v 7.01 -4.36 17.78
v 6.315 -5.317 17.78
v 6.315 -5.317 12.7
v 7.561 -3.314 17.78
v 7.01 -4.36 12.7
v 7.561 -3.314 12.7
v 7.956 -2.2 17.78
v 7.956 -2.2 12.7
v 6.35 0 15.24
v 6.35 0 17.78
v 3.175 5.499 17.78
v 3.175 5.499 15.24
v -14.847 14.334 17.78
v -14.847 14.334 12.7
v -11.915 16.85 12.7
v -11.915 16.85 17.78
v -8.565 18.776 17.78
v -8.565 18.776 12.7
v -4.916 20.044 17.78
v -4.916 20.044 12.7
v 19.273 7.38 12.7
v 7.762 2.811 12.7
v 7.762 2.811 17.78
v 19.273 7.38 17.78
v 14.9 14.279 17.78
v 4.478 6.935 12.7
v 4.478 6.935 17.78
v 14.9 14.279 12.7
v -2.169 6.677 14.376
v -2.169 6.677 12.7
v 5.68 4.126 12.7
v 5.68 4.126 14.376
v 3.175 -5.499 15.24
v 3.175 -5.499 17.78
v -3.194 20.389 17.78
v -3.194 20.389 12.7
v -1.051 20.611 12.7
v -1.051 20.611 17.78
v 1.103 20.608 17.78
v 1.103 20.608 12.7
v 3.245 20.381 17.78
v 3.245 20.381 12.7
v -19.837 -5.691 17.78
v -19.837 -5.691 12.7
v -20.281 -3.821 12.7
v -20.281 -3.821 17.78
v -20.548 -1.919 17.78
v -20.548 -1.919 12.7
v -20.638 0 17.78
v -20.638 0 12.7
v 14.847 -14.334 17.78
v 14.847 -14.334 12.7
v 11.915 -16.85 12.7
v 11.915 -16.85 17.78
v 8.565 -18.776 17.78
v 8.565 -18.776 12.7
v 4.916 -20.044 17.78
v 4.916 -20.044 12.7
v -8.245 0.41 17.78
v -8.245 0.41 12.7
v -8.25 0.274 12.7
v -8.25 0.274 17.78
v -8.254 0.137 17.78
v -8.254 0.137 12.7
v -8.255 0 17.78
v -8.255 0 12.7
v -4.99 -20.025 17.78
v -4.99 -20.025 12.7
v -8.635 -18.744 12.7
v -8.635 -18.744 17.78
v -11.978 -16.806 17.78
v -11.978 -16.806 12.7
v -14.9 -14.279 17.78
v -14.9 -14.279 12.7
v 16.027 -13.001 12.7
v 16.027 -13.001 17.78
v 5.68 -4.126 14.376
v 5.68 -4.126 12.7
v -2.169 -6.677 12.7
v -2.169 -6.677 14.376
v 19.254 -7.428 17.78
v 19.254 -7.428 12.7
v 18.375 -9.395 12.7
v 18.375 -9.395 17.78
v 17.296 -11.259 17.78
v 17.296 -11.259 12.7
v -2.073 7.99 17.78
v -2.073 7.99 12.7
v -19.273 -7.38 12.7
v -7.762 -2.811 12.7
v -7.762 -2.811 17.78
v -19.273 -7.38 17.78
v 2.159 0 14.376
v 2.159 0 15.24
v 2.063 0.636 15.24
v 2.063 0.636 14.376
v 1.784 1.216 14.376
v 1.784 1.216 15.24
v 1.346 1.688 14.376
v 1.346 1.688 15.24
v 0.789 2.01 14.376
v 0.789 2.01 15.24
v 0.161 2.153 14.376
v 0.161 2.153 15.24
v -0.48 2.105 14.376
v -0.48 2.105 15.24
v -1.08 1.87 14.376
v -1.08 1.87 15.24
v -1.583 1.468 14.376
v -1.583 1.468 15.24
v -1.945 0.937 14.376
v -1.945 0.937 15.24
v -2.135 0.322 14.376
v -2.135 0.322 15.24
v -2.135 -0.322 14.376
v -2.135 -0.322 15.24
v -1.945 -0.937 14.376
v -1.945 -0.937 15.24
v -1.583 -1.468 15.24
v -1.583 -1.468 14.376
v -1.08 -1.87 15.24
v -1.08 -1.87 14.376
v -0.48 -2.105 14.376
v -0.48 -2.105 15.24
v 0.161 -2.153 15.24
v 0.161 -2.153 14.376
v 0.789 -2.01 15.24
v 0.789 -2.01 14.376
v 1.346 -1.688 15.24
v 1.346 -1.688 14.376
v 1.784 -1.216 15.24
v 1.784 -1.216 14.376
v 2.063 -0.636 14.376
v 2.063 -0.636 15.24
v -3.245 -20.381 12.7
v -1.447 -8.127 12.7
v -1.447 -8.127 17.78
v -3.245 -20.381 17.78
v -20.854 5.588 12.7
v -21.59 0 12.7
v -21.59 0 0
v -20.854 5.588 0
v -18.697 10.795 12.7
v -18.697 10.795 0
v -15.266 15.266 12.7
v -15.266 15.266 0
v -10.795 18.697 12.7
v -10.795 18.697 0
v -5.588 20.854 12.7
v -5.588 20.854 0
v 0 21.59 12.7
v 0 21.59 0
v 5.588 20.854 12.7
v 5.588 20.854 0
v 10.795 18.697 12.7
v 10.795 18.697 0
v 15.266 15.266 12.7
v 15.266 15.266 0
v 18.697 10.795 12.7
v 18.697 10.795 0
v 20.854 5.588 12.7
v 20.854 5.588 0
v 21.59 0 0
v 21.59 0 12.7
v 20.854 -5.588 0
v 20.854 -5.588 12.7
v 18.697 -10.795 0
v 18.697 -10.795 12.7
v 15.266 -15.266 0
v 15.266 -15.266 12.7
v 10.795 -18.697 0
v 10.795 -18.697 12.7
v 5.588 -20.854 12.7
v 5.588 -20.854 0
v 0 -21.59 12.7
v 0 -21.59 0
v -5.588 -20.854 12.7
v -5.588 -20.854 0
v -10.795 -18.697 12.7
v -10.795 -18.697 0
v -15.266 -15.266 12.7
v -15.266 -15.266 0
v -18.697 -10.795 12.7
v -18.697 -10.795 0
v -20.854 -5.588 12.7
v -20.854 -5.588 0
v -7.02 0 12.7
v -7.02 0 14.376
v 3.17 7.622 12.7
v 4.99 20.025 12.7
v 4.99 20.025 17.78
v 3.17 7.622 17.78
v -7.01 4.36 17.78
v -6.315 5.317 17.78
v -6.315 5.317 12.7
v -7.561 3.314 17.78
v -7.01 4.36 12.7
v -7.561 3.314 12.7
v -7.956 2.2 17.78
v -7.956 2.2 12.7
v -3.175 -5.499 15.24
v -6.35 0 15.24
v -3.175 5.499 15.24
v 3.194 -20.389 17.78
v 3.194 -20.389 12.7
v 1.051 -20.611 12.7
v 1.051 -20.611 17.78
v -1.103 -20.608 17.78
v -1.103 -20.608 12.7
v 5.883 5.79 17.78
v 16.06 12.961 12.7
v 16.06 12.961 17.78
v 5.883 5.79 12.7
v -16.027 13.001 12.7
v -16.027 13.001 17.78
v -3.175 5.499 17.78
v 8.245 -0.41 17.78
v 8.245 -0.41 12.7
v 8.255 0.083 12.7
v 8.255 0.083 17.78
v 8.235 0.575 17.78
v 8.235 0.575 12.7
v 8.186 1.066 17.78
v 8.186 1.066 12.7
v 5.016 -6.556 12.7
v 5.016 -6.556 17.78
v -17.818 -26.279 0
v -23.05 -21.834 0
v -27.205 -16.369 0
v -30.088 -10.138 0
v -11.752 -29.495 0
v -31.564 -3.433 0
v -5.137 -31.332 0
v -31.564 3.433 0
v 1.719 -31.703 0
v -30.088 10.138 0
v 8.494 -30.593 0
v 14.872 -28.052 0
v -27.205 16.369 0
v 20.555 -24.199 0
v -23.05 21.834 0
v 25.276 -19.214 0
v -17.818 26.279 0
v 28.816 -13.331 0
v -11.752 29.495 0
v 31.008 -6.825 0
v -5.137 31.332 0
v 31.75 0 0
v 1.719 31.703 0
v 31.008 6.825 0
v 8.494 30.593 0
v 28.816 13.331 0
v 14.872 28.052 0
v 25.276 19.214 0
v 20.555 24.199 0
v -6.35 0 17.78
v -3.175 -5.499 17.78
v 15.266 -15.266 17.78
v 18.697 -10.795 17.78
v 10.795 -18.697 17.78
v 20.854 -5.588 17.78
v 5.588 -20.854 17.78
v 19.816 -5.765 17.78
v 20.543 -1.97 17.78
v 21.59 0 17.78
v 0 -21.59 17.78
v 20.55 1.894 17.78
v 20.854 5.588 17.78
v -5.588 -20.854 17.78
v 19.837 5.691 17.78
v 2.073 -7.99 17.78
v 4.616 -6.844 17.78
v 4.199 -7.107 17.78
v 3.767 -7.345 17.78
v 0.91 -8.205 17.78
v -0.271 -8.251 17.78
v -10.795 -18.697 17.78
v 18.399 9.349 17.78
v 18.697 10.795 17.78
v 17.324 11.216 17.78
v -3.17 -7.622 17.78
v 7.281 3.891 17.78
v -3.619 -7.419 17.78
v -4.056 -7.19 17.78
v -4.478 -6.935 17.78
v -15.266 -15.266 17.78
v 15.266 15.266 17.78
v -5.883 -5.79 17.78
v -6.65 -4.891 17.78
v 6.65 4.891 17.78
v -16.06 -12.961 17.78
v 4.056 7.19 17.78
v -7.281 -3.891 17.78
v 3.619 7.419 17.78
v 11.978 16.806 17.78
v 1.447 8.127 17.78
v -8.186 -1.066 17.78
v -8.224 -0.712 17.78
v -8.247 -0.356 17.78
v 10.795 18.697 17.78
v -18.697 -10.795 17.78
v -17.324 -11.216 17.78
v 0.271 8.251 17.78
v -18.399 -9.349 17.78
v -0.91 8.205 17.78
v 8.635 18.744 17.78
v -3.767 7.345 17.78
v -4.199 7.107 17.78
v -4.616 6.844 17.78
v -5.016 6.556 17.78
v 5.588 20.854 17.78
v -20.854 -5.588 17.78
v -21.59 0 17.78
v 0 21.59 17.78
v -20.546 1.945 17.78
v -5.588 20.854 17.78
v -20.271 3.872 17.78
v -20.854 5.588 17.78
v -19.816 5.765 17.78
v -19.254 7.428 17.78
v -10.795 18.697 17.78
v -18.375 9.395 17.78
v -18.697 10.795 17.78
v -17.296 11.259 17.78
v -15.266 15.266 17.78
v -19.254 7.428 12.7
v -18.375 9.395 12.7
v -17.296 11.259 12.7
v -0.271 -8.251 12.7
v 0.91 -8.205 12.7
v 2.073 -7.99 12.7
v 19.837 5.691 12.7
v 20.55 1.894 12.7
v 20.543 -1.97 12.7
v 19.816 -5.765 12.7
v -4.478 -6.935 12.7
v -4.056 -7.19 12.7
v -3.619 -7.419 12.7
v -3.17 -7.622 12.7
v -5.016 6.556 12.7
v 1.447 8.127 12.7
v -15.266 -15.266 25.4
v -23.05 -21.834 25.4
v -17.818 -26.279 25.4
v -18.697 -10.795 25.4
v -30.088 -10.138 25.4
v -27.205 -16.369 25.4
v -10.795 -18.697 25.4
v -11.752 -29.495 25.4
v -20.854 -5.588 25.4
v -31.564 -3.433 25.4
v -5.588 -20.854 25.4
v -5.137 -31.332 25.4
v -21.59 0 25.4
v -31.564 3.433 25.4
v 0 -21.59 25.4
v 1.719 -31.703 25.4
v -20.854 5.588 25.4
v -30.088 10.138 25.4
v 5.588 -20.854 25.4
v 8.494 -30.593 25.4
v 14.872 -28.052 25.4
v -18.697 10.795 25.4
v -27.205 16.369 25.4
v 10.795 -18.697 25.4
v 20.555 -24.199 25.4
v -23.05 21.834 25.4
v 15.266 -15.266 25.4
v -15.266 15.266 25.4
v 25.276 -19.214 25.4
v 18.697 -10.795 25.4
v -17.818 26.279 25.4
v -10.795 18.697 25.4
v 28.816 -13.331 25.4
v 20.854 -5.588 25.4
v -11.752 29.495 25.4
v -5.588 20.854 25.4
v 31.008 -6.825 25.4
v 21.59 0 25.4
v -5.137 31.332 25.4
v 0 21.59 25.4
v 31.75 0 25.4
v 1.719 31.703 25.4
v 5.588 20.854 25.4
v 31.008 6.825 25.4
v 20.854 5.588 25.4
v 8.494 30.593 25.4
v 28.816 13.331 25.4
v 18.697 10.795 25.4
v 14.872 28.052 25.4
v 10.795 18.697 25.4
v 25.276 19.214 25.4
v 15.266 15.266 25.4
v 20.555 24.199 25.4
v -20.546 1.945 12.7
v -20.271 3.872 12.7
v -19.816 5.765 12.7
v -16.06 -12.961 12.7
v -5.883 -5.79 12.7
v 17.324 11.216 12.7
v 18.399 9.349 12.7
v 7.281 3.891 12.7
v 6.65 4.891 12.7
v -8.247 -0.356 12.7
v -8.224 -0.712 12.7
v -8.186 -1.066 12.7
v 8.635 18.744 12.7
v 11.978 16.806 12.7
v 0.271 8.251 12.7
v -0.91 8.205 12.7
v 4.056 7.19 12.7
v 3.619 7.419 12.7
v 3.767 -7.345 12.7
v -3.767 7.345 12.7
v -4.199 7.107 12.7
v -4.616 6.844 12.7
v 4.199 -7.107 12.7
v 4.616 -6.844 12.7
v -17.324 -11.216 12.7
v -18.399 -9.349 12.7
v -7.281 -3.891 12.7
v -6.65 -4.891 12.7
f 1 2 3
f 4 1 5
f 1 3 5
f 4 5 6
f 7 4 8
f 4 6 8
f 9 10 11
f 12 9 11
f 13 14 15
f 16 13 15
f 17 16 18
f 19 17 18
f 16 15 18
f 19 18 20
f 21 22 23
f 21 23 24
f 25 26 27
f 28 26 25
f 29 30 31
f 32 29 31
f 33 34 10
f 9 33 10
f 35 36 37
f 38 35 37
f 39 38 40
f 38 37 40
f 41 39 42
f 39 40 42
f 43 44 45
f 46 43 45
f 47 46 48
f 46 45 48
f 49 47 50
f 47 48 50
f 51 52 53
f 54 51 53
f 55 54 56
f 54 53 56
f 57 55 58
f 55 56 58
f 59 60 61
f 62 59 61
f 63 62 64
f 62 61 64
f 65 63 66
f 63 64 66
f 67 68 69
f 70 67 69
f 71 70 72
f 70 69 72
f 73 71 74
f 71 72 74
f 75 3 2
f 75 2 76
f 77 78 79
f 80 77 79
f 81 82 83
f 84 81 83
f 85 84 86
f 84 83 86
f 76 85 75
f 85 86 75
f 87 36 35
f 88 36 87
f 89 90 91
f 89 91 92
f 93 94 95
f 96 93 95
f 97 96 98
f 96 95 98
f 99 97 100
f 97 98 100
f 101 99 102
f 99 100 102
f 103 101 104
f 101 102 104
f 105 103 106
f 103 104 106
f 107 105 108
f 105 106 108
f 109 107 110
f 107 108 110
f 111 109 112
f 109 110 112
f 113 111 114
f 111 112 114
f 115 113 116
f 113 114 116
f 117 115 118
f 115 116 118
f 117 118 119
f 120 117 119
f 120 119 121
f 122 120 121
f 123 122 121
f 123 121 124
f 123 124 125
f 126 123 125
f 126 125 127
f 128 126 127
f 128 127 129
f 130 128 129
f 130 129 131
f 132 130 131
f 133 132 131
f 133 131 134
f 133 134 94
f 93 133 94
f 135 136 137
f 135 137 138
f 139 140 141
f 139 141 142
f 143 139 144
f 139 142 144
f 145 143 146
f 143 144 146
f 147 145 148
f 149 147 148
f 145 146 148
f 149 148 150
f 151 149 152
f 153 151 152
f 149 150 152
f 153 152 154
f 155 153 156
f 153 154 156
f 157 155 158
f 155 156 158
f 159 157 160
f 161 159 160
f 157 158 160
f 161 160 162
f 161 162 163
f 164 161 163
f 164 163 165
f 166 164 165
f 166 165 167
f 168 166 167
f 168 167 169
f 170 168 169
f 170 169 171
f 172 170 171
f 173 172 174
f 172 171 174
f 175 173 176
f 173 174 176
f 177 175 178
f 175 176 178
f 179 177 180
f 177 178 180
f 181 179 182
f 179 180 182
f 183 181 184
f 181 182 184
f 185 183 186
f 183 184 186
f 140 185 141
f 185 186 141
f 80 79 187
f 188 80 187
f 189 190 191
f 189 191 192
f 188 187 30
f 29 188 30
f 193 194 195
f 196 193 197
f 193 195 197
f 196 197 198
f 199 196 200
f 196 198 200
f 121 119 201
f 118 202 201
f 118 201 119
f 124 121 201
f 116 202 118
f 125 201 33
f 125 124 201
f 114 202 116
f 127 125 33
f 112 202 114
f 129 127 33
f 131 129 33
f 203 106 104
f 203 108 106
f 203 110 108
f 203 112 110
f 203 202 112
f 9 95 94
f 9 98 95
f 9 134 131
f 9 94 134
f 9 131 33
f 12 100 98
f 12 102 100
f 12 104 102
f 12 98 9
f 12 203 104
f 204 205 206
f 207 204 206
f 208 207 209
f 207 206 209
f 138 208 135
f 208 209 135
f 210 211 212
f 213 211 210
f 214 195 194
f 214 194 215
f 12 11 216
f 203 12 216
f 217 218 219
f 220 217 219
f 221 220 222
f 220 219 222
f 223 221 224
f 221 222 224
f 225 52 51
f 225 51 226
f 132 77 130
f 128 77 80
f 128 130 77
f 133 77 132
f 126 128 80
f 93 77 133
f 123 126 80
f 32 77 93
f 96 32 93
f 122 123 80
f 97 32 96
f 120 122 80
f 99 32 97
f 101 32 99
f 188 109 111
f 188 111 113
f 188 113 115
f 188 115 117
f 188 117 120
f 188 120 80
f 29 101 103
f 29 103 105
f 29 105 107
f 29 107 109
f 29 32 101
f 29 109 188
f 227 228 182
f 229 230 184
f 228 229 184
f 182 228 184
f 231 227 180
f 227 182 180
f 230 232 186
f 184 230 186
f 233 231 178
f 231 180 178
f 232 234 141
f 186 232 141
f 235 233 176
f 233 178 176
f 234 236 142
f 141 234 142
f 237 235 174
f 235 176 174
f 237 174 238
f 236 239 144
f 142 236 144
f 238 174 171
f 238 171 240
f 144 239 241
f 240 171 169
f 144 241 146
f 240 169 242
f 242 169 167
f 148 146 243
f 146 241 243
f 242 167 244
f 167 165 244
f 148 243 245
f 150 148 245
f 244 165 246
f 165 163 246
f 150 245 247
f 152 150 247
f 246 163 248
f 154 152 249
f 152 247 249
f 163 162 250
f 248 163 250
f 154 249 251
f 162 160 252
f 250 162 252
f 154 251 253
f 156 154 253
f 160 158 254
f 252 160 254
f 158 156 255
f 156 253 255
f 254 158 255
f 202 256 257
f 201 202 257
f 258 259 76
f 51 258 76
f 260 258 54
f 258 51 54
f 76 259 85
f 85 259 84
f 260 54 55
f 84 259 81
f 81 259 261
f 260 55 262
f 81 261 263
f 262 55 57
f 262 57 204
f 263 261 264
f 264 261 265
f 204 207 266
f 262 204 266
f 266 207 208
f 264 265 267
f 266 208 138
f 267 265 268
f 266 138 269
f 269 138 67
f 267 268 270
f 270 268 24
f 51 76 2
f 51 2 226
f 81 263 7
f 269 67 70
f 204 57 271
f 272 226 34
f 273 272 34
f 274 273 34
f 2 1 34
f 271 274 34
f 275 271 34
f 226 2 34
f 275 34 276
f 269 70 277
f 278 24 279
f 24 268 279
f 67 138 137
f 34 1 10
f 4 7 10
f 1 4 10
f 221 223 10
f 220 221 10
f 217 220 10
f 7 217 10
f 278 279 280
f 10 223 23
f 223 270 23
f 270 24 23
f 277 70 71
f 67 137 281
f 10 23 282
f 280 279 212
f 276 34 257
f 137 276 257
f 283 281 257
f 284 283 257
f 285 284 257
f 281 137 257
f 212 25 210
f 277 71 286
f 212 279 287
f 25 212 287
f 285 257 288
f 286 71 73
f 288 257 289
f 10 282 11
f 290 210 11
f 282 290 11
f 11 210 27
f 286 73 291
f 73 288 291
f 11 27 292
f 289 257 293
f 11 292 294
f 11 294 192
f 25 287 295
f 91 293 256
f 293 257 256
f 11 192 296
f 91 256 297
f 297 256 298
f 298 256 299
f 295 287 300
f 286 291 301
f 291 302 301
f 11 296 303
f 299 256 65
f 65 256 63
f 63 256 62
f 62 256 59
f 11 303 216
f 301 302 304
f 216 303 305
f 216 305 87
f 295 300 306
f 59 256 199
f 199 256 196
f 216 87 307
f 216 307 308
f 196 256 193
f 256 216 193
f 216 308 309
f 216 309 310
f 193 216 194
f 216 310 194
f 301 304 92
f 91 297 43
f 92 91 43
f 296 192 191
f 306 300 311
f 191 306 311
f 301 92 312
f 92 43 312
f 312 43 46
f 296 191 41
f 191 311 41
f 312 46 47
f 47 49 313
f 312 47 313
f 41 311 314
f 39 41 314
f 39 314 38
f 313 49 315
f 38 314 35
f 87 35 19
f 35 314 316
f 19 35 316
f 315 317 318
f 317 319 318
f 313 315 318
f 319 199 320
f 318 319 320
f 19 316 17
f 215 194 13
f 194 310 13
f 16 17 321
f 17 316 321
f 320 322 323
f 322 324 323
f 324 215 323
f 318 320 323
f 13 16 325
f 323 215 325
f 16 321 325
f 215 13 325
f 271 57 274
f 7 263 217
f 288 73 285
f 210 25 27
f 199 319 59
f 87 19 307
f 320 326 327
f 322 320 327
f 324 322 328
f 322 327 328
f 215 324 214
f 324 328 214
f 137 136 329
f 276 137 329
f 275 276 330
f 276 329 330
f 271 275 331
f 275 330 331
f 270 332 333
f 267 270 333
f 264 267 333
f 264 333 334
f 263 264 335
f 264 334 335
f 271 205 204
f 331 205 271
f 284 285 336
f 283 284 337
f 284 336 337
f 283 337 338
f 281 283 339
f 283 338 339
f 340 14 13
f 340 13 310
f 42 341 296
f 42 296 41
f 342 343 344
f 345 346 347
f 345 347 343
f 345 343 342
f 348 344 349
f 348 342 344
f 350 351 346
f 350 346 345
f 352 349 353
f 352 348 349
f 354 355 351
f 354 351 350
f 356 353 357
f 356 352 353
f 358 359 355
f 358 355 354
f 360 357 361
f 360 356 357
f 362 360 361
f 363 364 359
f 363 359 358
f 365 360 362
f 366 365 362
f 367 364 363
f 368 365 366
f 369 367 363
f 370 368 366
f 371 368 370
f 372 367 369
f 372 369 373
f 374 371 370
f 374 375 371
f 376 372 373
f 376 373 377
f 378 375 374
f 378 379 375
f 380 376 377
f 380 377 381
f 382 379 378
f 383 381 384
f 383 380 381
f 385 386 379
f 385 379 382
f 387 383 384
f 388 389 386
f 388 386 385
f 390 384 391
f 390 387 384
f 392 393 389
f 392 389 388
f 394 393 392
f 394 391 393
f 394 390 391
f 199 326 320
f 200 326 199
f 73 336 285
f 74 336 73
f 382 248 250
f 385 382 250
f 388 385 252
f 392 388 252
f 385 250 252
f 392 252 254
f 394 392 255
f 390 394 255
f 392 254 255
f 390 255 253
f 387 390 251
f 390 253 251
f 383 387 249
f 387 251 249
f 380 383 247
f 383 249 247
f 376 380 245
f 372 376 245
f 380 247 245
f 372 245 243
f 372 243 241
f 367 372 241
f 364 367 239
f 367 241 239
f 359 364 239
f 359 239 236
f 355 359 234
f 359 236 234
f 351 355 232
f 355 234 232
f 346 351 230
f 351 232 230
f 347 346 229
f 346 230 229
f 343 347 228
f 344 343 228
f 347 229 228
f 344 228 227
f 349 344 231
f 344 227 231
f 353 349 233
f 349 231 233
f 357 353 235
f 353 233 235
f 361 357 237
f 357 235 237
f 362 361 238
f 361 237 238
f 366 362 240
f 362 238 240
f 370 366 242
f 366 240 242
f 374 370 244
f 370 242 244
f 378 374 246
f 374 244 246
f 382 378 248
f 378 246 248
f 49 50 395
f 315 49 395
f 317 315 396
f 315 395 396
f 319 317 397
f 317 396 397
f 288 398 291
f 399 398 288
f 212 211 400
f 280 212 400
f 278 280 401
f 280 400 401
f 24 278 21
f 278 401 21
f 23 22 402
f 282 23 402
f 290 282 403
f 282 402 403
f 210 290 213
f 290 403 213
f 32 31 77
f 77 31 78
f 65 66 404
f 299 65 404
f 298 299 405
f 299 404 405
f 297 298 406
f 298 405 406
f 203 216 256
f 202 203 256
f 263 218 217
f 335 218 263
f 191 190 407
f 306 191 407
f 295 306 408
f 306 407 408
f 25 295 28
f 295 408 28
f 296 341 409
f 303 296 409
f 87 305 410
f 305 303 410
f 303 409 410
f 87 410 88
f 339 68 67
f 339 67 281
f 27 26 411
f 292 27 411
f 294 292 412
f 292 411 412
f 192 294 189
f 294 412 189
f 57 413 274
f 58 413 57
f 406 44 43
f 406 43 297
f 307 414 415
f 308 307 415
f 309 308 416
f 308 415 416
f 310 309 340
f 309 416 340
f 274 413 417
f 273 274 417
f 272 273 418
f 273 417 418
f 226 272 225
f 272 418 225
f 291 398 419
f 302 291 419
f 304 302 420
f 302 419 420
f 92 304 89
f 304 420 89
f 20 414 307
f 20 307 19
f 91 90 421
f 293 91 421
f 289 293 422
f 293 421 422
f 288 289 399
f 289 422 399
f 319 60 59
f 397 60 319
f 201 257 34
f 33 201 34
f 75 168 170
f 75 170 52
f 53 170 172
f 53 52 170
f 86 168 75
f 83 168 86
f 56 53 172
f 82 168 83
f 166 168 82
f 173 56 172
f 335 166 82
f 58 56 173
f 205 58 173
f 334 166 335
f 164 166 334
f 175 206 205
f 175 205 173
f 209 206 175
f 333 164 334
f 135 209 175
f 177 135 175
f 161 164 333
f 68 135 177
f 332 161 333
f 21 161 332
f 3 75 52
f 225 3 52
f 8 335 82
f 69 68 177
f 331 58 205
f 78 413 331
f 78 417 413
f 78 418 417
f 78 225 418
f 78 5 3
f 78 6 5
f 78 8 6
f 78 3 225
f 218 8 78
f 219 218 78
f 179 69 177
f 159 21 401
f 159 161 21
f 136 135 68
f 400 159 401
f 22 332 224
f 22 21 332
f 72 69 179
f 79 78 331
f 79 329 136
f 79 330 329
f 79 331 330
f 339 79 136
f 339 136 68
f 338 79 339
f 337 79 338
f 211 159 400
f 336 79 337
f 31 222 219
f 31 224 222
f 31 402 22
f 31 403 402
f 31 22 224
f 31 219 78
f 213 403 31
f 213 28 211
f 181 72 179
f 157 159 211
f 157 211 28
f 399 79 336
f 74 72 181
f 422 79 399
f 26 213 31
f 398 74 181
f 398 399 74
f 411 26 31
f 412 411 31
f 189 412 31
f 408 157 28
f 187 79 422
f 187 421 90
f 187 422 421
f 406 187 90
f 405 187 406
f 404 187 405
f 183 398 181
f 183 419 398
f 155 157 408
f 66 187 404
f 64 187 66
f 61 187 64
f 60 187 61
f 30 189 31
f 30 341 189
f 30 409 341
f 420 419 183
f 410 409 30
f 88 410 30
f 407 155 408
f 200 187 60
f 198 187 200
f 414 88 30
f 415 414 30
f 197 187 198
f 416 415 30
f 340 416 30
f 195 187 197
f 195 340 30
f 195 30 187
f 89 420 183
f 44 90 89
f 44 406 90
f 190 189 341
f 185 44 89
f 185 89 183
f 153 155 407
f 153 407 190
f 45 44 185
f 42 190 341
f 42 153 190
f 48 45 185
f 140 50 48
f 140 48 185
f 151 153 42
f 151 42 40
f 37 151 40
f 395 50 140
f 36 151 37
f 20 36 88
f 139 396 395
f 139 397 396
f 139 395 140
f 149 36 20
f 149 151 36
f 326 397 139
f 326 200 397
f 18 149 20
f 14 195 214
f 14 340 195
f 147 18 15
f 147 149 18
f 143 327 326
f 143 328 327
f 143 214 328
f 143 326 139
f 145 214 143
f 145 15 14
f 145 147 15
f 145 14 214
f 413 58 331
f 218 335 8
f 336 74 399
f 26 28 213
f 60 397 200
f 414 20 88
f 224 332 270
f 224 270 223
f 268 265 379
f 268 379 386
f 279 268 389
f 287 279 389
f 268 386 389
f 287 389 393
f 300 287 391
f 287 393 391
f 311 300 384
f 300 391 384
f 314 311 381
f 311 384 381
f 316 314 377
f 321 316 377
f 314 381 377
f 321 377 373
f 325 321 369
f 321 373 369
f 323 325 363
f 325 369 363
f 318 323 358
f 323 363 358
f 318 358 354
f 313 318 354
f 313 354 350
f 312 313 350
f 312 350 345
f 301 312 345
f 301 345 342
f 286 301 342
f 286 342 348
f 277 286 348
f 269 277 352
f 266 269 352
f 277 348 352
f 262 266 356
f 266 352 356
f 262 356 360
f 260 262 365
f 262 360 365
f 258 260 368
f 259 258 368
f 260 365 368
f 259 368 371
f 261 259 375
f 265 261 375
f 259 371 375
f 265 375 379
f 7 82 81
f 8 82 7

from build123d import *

# Parameters (mm, degrees)
SKETCH1_R           = 31.75
BOSS_EXTRUDE1_DEPTH = 25.4
SKETCH3_R           = 21.59
CUT_EXTRUDE1_DEPTH  = 7.62
SKETCH4_R           = 21.59
CUT_EXTRUDE2_DEPTH  = 12.7
CUT_EXTRUDE3_DEPTH  = 13.7
BOSS_EXTRUDE2_DEPTH = 5.08
CIRPATTERN1_COUNT   = 6
CUT_EXTRUDE5_DEPTH  = 2.54
SKETCH8_R           = 2.159
CUT_EXTRUDE6_DEPTH  = 2.54
CUT_EXTRUDE7_DEPTH  = 1.6764


with BuildPart() as part:
    # Sketch1 → Boss-Extrude1 (new body)
    with BuildSketch(Plane.XY):
        Circle(SKETCH1_R)
    extrude(amount=BOSS_EXTRUDE1_DEPTH)

    # Sketch3 → Cut-Extrude1 (cut)
    with BuildSketch(Plane.XY.offset(25.4)):
        Circle(SKETCH3_R)
    extrude(amount=-CUT_EXTRUDE1_DEPTH, mode=Mode.SUBTRACT)

    # Sketch4 → Cut-Extrude2 (cut)
    with BuildSketch(Plane(origin=(0, 0, 0), x_dir=(-1, 0, 0), z_dir=(0, 0, -1))):
        Circle(SKETCH4_R)
    extrude(amount=-CUT_EXTRUDE2_DEPTH, mode=Mode.SUBTRACT)

    # Sketch5 → Cut-Extrude3 (cut, through all)
    with BuildSketch(Plane(origin=(0, 0, 12.7), x_dir=(-1, 0, 0), z_dir=(0, 0, -1))):
        with BuildLine():
            Line((-3.169774213, 7.622175309), (-4.990334321, 20.025058542))
            ThreePointArc((-4.990334321, 20.025058542), (-12.706659311, -16.261833088), (20.6375, 0))
            ThreePointArc((20.6375, 0), (16.238120297, 12.736948436), (4.915648471, 20.043522803))
            Line((4.915648471, 20.043522803), (3.767056418, 7.345359824))
            ThreePointArc((3.767056418, 7.345359824), (7.044220174, 4.303950178), (8.255, 0))
            ThreePointArc((8.255, 0), (-4.581404745, -6.867004847), (-3.169774213, 7.622175309))
        make_face()
        with BuildLine():
            ThreePointArc((-3.245486062, 20.380707212), (-4.121747911, 20.221711115), (-4.990334321, 20.025058542))
            Line((-4.990334321, 20.025058542), (-3.169774213, 7.622175309))
            ThreePointArc((-3.169774213, 7.622175309), (-2.322085611, 7.921675543), (-1.446854472, 8.127215829))
            Line((-1.446854472, 8.127215829), (-3.245486062, 20.380707212))
        make_face()
        with BuildLine():
            ThreePointArc((3.194434326, 20.388771311), (-0.025842356, 20.63748382), (-3.245486062, 20.380707212))
            Line((-3.245486062, 20.380707212), (-1.446854472, 8.127215829))
            ThreePointArc((-1.446854472, 8.127215829), (0.320434302, 8.248778507), (2.072967036, 7.990483882))
            Line((2.072967036, 7.990483882), (3.194434326, 20.388771311))
        make_face()
        with BuildLine():
            ThreePointArc((4.915648471, 20.043522803), (4.058714067, 20.234456908), (3.194434326, 20.388771311))
            Line((3.194434326, 20.388771311), (2.072967036, 7.990483882))
            ThreePointArc((2.072967036, 7.990483882), (2.937773774, 7.714564813), (3.767056418, 7.345359824))
            Line((3.767056418, 7.345359824), (4.915648471, 20.043522803))
        make_face()
    extrude(amount=-CUT_EXTRUDE3_DEPTH, mode=Mode.SUBTRACT)

    # Sketch5<3> → Boss-Extrude2 (add)
    with BuildSketch(Plane(origin=(0, 0, 12.7), x_dir=(-1, 0, 0), z_dir=(0, 0, -1))):
        with BuildLine():
            ThreePointArc((-3.245486062, 20.380707212), (-4.121747911, 20.221711115), (-4.990334321, 20.025058542))
            Line((-4.990334321, 20.025058542), (-3.169774213, 7.622175309))
            ThreePointArc((-3.169774213, 7.622175309), (-2.322085611, 7.921675543), (-1.446854472, 8.127215829))
            Line((-1.446854472, 8.127215829), (-3.245486062, 20.380707212))
        make_face()
        with BuildLine():
            ThreePointArc((4.915648471, 20.043522803), (4.058714067, 20.234456908), (3.194434326, 20.388771311))
            Line((3.194434326, 20.388771311), (2.072967036, 7.990483882))
            ThreePointArc((2.072967036, 7.990483882), (2.937773774, 7.714564813), (3.767056418, 7.345359824))
            Line((3.767056418, 7.345359824), (4.915648471, 20.043522803))
        make_face()
    boss_extrude2 = extrude(amount=-BOSS_EXTRUDE2_DEPTH)

    # CirPattern1: Boss-Extrude2 ×6 about axis
    cirpattern1_axis = Axis((0, 0, 0), (0, 0, 1))
    for i in range(1, CIRPATTERN1_COUNT):
        add(boss_extrude2.rotate(cirpattern1_axis, i * 360 / CIRPATTERN1_COUNT))

    # Sketch7 → Cut-Extrude5 (cut)
    with BuildSketch(Plane.XY.offset(17.78)):
        Polygon((6.35, 0), (3.175, 5.499261314), (-3.175, 5.499261314), (-6.35, 0), (-3.175, -5.499261314), (3.175, -5.499261314), align=None)
    extrude(amount=-CUT_EXTRUDE5_DEPTH, mode=Mode.SUBTRACT)

    # Sketch8 → Cut-Extrude6 (cut)
    with BuildSketch(Plane.XY.offset(15.24)):
        Circle(SKETCH8_R)
    extrude(amount=-CUT_EXTRUDE6_DEPTH, mode=Mode.SUBTRACT)

    # Sketch9 → Cut-Extrude7 (cut)
    with BuildSketch(Plane(origin=(0, 0, 12.7), x_dir=(-1, 0, 0), z_dir=(0, 0, -1))):
        Polygon((7.020387337, 0), (2.169418994, 6.676785124), (-5.679612663, 4.126480142), (-5.679612663, -4.126480142), (2.169418994, -6.676785124), align=None)
    extrude(amount=-CUT_EXTRUDE7_DEPTH, mode=Mode.SUBTRACT)


solid = part.part
